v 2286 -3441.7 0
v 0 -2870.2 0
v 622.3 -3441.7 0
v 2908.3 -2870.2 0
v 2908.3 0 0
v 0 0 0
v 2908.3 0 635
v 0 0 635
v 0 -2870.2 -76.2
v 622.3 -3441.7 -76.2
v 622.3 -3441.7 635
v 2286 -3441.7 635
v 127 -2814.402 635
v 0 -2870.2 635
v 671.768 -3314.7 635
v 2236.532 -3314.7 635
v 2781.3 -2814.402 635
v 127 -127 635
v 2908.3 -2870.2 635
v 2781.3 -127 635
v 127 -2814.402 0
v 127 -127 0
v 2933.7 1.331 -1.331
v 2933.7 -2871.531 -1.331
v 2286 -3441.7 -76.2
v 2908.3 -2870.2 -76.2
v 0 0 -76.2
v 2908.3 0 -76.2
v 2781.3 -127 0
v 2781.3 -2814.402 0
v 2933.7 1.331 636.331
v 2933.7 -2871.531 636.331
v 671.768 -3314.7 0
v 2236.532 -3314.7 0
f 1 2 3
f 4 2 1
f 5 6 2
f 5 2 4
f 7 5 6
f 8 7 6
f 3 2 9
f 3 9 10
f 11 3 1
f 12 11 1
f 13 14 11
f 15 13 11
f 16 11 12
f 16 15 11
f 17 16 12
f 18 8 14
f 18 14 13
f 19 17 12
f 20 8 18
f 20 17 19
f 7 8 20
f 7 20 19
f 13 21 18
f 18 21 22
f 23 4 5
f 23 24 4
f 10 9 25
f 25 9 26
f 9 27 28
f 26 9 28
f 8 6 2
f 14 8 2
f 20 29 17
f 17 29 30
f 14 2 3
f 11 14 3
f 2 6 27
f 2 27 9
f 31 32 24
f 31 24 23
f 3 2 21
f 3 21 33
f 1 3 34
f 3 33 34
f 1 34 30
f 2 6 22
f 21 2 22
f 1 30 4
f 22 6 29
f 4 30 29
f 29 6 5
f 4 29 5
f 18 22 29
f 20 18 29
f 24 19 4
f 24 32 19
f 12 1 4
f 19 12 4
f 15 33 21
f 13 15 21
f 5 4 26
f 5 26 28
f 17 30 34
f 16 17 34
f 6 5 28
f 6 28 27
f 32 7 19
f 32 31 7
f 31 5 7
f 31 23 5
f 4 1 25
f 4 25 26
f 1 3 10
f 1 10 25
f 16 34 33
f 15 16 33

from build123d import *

# Parameters (mm, degrees)
F1_DEPTH  = 76.2
F2_DEPTH  = 635
F2_FACE_W = 2870.2
F2_FACE_H = 635
F3_DEPTH  = 25.4
F3_TAPER  = -3


with BuildPart() as f1:
    # F0 (on Top) → F1 (new body)
    with BuildSketch(Plane.XY):
        Polygon((2908.3, 0), (0, 0), (0, -2870.2), (622.3, -3441.7), (2286, -3441.7), (2908.3, -2870.2), align=None)
        Polygon((671.7684459615, -3314.7), (127, -2814.4024475864), (127, -127), (2781.3, -127), (2781.3, -2814.4024475864), (2236.5315540385, -3314.7), align=None, mode=Mode.SUBTRACT)
        Polygon((127, -127), (127, -2814.4024475864), (671.7684459615, -3314.7), (2236.5315540385, -3314.7), (2781.3, -2814.4024475864), (2781.3, -127), align=None)
    extrude(amount=-F1_DEPTH)


with BuildPart() as f2:
    # F0 (on Top) → F2 (new body)
    with BuildSketch(Plane.XY):
        Polygon((2908.3, 0), (0, 0), (0, -2870.2), (622.3, -3441.7), (2286, -3441.7), (2908.3, -2870.2), align=None)
        Polygon((671.7684459615, -3314.7), (127, -2814.4024475864), (127, -127), (2781.3, -127), (2781.3, -2814.4024475864), (2236.5315540385, -3314.7), align=None, mode=Mode.SUBTRACT)
    extrude(amount=F2_DEPTH)

    # F2_face (on face) → F3 (join)
    with BuildSketch(Plane(origin=(2908.3, -1435.1, 317.5), x_dir=(0, 1, 0), z_dir=(1, 0, 0))):
        Rectangle(F2_FACE_W, F2_FACE_H)
    extrude(amount=F3_DEPTH, taper=F3_TAPER)


solid = Compound([f1.part, f2.part])
